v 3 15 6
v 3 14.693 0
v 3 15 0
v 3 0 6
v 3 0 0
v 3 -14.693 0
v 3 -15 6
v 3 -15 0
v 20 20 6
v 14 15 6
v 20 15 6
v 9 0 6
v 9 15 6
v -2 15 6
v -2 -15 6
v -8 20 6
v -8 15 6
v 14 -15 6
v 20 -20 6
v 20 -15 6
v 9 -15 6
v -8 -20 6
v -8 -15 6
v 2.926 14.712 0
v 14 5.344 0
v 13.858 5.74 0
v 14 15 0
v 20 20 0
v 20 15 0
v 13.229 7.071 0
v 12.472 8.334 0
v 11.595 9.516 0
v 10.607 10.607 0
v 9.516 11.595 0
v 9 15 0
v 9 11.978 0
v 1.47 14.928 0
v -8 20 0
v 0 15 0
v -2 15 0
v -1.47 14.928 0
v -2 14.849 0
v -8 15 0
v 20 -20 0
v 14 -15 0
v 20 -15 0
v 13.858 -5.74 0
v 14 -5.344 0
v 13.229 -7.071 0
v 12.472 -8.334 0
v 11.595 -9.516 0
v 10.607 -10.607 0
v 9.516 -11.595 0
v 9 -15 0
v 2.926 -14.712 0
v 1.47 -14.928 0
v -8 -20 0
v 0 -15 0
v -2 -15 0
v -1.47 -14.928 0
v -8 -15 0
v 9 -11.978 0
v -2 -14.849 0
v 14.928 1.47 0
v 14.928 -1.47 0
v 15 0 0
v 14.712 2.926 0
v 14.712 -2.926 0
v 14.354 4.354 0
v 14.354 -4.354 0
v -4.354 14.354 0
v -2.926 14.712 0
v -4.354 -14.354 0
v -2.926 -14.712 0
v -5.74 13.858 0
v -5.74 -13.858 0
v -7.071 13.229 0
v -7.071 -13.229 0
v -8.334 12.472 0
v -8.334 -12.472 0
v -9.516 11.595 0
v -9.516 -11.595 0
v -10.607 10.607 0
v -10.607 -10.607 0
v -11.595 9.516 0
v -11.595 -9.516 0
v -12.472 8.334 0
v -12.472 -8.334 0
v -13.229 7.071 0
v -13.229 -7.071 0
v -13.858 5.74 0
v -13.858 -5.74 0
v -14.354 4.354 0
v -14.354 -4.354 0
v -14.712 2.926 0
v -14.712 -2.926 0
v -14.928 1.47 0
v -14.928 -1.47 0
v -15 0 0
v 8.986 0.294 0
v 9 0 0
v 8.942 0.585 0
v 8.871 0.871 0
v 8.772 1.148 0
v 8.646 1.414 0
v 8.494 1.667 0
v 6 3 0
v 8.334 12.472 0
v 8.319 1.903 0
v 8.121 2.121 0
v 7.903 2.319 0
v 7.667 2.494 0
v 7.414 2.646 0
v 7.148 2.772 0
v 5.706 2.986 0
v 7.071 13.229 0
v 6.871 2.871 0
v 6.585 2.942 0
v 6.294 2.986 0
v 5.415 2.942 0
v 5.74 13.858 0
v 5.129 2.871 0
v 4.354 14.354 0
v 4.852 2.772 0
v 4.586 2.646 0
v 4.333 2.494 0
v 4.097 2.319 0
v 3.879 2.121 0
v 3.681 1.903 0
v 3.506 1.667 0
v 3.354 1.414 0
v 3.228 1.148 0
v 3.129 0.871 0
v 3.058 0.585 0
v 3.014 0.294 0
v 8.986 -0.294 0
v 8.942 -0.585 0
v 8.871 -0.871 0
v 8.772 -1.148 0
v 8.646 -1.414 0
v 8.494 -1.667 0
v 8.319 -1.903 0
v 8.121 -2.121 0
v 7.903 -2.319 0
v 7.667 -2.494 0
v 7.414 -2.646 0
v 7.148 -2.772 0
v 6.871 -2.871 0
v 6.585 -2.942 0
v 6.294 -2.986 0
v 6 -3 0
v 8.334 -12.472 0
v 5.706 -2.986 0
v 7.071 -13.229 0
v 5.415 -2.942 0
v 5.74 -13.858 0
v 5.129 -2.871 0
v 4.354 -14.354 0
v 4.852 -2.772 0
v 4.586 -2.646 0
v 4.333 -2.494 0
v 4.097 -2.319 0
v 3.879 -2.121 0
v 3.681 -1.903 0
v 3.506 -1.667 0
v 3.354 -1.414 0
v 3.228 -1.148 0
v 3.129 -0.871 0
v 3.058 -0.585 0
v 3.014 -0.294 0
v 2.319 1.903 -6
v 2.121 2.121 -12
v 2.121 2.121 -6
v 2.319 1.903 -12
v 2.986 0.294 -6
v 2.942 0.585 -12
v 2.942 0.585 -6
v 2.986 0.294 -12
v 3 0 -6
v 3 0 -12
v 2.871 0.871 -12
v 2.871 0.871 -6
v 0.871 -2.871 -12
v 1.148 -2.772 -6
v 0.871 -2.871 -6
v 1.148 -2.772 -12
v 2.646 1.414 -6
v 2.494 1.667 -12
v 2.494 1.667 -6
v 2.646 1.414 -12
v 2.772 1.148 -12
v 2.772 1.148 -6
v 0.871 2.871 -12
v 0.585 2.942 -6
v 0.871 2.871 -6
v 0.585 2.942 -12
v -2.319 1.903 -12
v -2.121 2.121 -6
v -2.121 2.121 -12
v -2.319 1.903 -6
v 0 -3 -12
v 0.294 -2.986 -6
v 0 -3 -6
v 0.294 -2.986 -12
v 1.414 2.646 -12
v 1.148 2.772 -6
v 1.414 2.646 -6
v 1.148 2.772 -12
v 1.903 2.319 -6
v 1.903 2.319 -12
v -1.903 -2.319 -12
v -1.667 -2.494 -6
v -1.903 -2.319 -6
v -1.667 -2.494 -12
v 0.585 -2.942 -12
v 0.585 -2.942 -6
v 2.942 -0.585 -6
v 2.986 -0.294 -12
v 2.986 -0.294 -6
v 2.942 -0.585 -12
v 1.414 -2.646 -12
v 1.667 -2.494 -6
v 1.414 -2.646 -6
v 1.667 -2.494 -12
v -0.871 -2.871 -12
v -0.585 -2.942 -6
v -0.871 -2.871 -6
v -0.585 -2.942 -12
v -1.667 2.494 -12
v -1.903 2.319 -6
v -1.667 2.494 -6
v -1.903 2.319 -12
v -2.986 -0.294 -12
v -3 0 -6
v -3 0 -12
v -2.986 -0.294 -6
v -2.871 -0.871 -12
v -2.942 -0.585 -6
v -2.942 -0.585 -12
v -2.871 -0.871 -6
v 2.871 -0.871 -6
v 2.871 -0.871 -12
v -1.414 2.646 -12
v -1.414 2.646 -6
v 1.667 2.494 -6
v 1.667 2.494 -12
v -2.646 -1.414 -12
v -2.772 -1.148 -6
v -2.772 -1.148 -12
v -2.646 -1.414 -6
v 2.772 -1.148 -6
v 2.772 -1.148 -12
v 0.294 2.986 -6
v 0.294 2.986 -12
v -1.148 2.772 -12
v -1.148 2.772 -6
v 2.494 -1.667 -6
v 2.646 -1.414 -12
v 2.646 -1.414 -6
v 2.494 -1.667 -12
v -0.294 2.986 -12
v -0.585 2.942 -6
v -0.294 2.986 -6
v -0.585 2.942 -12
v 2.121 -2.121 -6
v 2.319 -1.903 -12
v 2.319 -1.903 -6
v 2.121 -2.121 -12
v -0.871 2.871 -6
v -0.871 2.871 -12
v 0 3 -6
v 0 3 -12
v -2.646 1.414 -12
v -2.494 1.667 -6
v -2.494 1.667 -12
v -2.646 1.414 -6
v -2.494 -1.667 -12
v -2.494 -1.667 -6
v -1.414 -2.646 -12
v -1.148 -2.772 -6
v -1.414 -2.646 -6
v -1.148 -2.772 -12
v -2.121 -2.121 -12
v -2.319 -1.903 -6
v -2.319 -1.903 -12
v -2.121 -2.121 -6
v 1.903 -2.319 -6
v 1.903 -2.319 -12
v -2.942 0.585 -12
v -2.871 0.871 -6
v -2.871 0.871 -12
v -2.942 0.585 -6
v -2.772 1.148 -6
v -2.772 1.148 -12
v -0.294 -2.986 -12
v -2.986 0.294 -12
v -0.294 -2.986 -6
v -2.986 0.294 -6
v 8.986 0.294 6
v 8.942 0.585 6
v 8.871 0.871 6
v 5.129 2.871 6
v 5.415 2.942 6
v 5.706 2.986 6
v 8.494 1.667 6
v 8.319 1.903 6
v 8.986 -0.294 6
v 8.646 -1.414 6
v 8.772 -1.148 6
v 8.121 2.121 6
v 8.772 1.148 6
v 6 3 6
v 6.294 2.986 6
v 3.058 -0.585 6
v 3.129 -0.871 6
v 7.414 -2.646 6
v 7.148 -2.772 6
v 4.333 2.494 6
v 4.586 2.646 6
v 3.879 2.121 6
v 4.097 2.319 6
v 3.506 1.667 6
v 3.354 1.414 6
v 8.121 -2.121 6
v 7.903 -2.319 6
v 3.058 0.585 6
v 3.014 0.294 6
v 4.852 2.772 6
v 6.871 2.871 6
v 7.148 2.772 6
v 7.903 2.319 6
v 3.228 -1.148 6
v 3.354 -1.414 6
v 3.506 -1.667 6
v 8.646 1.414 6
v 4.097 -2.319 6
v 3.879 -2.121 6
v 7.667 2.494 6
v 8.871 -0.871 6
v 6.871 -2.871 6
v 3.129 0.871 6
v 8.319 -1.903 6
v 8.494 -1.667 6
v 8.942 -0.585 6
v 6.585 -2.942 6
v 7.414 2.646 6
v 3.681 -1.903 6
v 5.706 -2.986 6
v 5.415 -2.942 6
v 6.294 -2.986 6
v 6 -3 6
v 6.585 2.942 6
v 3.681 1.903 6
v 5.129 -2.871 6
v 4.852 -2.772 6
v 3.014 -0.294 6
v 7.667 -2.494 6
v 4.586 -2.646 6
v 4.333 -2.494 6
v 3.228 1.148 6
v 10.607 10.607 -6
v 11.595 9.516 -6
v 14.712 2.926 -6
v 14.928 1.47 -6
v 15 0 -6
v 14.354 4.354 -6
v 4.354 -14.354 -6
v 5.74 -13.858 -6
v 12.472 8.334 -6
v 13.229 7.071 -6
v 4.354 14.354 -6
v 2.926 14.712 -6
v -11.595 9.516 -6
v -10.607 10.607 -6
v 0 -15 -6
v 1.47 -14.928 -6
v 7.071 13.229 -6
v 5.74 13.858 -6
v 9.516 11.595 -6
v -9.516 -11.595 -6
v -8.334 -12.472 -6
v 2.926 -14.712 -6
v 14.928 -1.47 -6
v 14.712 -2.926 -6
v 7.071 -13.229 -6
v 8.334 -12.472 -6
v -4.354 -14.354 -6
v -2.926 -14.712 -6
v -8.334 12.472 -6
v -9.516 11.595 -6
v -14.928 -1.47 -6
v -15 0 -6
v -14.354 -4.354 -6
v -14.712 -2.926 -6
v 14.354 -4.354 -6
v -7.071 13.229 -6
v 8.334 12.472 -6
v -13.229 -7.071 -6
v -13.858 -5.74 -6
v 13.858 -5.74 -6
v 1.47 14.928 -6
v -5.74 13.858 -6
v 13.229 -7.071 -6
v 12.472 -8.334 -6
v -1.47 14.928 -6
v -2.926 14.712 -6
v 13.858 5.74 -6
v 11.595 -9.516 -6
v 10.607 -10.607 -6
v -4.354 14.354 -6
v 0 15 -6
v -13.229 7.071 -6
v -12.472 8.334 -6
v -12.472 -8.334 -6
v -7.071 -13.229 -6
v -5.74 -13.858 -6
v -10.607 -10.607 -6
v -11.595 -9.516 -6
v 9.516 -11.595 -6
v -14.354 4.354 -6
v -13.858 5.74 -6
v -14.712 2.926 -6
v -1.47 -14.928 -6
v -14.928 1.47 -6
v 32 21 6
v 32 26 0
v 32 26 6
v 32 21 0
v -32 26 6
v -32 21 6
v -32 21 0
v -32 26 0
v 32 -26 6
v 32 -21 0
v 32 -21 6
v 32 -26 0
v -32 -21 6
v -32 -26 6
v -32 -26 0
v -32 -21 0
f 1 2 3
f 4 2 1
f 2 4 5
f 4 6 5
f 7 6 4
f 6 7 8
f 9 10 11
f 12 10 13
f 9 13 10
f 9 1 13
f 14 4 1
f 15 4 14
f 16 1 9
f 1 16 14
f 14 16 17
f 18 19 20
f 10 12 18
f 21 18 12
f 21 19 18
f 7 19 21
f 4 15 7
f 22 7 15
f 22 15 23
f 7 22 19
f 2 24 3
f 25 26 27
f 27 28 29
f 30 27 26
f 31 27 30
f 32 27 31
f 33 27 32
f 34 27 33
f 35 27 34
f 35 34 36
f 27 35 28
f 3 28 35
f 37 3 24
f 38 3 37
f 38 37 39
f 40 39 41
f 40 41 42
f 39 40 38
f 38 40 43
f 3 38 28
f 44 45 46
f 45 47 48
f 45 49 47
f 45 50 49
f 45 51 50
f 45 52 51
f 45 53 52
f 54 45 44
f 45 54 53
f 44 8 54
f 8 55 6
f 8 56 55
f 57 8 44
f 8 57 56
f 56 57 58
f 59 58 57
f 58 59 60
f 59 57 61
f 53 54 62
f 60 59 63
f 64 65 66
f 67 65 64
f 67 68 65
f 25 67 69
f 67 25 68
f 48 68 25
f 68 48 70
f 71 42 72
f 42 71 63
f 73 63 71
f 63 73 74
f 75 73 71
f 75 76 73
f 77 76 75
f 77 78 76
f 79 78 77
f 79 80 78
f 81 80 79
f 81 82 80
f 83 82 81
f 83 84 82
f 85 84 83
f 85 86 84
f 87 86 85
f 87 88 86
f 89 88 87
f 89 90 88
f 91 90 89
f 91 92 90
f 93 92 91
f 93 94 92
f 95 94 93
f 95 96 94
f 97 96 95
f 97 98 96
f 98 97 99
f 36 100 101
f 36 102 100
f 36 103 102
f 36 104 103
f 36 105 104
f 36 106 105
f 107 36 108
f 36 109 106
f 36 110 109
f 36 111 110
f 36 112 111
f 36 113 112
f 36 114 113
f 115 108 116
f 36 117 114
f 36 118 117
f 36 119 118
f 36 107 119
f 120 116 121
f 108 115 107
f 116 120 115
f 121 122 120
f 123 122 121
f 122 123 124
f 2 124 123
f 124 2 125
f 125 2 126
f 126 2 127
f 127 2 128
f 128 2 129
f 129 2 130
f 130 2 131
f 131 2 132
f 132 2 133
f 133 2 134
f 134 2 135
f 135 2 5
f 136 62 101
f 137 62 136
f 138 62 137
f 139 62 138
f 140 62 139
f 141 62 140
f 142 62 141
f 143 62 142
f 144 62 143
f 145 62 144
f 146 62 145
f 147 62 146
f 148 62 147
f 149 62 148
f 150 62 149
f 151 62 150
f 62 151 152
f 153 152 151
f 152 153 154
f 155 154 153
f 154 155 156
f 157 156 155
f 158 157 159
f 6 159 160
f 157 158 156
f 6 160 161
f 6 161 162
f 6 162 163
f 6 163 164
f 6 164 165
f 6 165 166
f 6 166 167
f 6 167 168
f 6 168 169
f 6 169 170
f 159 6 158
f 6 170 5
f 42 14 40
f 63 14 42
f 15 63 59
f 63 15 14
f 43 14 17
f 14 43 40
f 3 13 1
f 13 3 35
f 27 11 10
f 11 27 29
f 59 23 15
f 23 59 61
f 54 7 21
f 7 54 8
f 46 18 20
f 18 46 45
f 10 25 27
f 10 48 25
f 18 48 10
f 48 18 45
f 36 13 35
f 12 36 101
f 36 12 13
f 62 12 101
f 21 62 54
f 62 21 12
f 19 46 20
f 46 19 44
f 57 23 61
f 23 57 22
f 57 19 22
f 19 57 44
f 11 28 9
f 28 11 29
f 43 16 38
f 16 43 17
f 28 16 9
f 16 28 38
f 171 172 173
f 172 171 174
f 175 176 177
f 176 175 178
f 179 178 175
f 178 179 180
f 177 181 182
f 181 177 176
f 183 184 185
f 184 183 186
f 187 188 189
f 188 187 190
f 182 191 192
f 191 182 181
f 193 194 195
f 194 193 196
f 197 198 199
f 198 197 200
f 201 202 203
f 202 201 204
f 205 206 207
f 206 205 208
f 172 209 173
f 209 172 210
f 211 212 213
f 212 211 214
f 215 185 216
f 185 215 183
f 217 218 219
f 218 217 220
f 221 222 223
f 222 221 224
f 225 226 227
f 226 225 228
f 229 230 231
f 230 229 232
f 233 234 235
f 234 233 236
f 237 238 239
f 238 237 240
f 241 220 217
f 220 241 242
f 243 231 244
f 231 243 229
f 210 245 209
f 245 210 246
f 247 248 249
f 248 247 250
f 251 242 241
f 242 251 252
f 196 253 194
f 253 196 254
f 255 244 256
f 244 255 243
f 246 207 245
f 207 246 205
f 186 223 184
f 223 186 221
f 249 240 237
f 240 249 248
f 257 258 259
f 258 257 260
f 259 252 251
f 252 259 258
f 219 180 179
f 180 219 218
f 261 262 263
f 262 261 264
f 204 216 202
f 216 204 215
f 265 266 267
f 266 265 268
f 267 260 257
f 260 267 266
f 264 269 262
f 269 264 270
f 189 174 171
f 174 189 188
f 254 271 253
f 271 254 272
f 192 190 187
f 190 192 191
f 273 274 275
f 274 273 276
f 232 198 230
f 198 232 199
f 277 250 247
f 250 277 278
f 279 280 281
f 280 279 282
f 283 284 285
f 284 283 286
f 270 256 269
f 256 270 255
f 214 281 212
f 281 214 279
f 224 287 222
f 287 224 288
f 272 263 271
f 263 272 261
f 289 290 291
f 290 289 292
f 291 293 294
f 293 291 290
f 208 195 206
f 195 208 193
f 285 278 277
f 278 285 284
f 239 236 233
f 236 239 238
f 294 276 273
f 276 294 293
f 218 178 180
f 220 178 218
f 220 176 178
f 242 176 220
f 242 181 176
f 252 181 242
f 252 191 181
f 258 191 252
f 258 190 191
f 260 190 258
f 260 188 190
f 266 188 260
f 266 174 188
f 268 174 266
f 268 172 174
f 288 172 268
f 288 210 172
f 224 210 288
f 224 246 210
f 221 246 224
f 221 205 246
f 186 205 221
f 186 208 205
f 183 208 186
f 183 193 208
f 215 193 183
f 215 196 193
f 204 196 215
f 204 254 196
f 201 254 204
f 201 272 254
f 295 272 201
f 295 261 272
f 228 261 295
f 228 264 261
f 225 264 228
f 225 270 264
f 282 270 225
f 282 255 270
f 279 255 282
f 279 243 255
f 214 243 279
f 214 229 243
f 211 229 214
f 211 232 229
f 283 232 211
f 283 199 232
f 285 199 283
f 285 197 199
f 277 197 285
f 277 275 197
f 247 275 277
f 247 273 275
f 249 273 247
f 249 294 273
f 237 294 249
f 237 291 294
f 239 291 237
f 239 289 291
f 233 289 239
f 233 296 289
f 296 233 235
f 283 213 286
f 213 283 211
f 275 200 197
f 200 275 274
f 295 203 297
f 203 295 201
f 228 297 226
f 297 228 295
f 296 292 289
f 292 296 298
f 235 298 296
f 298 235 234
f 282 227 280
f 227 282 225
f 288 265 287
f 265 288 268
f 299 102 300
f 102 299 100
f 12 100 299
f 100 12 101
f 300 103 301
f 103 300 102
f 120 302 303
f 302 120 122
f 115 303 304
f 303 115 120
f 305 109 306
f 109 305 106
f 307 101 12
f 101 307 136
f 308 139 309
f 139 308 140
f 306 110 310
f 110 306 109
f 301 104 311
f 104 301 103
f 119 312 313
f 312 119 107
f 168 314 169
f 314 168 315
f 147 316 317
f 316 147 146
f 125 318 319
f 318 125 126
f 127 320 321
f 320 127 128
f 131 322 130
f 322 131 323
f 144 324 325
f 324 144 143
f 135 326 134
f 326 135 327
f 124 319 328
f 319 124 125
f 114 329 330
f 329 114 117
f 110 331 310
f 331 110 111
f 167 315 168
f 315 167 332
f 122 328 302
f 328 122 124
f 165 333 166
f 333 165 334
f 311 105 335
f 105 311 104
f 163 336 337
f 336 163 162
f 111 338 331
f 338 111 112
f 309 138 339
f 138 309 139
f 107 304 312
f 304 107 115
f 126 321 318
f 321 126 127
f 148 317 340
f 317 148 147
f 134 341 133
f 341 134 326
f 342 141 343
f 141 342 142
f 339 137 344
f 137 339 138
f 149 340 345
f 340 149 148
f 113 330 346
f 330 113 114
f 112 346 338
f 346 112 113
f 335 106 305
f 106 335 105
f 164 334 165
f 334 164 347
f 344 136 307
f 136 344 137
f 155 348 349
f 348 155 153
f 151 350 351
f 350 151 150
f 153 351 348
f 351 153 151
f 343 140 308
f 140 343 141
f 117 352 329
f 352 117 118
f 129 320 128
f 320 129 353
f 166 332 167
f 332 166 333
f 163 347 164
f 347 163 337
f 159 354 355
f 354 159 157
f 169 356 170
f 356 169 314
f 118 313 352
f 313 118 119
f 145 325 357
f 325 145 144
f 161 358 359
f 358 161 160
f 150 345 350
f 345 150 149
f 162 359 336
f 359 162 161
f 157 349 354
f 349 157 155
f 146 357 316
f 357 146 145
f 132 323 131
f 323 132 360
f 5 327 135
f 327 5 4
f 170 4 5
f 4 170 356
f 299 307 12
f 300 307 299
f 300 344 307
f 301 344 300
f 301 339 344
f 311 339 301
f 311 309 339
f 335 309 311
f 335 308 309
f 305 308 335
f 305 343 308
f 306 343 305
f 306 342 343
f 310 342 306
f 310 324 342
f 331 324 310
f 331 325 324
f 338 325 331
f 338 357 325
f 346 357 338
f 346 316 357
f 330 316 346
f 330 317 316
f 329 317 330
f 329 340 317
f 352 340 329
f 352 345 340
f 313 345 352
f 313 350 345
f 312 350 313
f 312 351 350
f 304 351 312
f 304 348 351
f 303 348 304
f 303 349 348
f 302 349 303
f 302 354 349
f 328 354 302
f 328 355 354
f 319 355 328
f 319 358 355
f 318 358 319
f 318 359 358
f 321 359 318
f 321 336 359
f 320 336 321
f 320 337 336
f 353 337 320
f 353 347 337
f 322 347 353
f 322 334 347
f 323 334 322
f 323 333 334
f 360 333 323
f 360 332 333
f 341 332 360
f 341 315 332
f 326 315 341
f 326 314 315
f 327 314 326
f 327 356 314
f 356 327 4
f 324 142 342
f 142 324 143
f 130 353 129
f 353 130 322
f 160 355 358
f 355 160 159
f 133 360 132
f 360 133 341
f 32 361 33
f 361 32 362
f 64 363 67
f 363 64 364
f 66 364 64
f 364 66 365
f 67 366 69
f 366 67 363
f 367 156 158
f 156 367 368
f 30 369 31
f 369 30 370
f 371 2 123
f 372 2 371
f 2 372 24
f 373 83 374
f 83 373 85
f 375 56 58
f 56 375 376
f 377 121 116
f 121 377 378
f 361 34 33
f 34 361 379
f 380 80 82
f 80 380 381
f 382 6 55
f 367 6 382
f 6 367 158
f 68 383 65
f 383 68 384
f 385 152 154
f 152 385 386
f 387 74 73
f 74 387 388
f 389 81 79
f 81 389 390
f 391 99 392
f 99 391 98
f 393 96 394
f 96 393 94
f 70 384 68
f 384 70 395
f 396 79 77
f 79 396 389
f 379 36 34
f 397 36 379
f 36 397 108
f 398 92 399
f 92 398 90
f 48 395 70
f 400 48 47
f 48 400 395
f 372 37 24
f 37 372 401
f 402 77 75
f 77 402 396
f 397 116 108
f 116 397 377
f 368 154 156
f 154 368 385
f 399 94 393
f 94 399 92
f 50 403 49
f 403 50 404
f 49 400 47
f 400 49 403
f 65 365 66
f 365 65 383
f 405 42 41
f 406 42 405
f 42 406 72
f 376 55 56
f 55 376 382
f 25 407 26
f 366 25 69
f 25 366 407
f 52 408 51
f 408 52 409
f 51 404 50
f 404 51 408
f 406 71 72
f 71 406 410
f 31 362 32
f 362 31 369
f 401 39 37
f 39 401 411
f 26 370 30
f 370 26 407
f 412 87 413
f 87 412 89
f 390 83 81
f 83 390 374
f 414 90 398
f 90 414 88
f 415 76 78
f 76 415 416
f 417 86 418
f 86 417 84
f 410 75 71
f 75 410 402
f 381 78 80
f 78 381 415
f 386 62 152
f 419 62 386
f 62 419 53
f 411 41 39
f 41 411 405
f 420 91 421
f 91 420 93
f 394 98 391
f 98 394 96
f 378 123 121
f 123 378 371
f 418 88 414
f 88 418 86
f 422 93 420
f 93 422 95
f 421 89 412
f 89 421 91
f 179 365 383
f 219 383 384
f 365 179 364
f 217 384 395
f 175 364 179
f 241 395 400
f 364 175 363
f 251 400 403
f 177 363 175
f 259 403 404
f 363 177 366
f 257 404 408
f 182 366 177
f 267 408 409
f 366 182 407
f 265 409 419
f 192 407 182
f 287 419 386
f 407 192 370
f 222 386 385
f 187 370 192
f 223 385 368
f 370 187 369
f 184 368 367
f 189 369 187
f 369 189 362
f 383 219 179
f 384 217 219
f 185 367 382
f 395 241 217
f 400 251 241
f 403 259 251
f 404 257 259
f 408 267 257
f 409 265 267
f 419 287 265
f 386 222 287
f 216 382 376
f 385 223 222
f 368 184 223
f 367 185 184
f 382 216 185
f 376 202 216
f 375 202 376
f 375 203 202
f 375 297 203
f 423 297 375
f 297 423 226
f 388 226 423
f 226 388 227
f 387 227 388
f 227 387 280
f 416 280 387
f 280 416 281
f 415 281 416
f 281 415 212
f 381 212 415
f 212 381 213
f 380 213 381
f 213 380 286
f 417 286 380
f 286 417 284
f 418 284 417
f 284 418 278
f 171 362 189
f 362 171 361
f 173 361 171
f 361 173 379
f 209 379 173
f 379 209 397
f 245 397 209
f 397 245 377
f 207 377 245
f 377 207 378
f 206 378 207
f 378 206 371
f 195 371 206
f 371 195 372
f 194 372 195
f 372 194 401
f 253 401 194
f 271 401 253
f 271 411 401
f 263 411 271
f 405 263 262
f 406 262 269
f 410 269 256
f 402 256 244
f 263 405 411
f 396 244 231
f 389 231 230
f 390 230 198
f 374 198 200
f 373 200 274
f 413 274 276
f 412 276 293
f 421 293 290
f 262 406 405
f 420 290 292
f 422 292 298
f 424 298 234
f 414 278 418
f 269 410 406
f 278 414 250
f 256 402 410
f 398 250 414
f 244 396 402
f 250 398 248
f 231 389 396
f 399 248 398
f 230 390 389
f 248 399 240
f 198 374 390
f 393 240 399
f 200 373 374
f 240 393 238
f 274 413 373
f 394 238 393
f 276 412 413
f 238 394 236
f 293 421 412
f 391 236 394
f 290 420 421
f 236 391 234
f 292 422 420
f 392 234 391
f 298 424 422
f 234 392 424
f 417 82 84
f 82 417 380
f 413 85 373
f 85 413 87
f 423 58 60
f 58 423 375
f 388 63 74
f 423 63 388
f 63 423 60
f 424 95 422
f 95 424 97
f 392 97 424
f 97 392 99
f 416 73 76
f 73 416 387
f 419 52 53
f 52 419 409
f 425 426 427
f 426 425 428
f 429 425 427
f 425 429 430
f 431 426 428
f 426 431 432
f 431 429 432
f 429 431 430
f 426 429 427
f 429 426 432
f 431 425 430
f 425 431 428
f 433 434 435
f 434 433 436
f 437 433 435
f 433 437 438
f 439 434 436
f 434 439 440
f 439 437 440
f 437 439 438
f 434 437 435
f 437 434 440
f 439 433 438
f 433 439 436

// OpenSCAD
$time = 0;

h=6;
cr = 9;
mr = 6;
fw = 5;


module OF(){
    translate([-fw+mr-3,-(cr+mr),0])cube([fw,(cr+mr)*2,h]);
    translate([mr+3,-(cr+mr),0])cube([fw,(cr+mr)*2,h]);
    translate([-fw-(cr-mr),-(cr+mr)-fw,0])cube([fw*2+cr*2,fw,h]);
    translate([-fw-(cr-mr),(cr+mr),0])cube([fw*2+cr*2,fw,h]);
}
    


module OC(){
    translate([0,0,-2*h])cylinder(r=3,h=h*2,$fn=64);
    translate([mr,0,0])cylinder(r=3,h=h,$fn=64);
    translate([0,0,-h])cylinder(r=cr+mr,h=h,$fn=64);
}

translate([-fw-(cr-mr)-mr*4,(cr+mr)+fw+1,0])cube([fw*2+cr*2+mr*6,fw,h]);
translate([-fw-(cr-mr)-mr*4,-(cr+mr)-2*fw-1,0])cube([fw*2+cr*2+mr*6,fw,h]);

translate([mr*(cos($time)-1),0,0])OF();
rotate([0,0,$time])OC();
